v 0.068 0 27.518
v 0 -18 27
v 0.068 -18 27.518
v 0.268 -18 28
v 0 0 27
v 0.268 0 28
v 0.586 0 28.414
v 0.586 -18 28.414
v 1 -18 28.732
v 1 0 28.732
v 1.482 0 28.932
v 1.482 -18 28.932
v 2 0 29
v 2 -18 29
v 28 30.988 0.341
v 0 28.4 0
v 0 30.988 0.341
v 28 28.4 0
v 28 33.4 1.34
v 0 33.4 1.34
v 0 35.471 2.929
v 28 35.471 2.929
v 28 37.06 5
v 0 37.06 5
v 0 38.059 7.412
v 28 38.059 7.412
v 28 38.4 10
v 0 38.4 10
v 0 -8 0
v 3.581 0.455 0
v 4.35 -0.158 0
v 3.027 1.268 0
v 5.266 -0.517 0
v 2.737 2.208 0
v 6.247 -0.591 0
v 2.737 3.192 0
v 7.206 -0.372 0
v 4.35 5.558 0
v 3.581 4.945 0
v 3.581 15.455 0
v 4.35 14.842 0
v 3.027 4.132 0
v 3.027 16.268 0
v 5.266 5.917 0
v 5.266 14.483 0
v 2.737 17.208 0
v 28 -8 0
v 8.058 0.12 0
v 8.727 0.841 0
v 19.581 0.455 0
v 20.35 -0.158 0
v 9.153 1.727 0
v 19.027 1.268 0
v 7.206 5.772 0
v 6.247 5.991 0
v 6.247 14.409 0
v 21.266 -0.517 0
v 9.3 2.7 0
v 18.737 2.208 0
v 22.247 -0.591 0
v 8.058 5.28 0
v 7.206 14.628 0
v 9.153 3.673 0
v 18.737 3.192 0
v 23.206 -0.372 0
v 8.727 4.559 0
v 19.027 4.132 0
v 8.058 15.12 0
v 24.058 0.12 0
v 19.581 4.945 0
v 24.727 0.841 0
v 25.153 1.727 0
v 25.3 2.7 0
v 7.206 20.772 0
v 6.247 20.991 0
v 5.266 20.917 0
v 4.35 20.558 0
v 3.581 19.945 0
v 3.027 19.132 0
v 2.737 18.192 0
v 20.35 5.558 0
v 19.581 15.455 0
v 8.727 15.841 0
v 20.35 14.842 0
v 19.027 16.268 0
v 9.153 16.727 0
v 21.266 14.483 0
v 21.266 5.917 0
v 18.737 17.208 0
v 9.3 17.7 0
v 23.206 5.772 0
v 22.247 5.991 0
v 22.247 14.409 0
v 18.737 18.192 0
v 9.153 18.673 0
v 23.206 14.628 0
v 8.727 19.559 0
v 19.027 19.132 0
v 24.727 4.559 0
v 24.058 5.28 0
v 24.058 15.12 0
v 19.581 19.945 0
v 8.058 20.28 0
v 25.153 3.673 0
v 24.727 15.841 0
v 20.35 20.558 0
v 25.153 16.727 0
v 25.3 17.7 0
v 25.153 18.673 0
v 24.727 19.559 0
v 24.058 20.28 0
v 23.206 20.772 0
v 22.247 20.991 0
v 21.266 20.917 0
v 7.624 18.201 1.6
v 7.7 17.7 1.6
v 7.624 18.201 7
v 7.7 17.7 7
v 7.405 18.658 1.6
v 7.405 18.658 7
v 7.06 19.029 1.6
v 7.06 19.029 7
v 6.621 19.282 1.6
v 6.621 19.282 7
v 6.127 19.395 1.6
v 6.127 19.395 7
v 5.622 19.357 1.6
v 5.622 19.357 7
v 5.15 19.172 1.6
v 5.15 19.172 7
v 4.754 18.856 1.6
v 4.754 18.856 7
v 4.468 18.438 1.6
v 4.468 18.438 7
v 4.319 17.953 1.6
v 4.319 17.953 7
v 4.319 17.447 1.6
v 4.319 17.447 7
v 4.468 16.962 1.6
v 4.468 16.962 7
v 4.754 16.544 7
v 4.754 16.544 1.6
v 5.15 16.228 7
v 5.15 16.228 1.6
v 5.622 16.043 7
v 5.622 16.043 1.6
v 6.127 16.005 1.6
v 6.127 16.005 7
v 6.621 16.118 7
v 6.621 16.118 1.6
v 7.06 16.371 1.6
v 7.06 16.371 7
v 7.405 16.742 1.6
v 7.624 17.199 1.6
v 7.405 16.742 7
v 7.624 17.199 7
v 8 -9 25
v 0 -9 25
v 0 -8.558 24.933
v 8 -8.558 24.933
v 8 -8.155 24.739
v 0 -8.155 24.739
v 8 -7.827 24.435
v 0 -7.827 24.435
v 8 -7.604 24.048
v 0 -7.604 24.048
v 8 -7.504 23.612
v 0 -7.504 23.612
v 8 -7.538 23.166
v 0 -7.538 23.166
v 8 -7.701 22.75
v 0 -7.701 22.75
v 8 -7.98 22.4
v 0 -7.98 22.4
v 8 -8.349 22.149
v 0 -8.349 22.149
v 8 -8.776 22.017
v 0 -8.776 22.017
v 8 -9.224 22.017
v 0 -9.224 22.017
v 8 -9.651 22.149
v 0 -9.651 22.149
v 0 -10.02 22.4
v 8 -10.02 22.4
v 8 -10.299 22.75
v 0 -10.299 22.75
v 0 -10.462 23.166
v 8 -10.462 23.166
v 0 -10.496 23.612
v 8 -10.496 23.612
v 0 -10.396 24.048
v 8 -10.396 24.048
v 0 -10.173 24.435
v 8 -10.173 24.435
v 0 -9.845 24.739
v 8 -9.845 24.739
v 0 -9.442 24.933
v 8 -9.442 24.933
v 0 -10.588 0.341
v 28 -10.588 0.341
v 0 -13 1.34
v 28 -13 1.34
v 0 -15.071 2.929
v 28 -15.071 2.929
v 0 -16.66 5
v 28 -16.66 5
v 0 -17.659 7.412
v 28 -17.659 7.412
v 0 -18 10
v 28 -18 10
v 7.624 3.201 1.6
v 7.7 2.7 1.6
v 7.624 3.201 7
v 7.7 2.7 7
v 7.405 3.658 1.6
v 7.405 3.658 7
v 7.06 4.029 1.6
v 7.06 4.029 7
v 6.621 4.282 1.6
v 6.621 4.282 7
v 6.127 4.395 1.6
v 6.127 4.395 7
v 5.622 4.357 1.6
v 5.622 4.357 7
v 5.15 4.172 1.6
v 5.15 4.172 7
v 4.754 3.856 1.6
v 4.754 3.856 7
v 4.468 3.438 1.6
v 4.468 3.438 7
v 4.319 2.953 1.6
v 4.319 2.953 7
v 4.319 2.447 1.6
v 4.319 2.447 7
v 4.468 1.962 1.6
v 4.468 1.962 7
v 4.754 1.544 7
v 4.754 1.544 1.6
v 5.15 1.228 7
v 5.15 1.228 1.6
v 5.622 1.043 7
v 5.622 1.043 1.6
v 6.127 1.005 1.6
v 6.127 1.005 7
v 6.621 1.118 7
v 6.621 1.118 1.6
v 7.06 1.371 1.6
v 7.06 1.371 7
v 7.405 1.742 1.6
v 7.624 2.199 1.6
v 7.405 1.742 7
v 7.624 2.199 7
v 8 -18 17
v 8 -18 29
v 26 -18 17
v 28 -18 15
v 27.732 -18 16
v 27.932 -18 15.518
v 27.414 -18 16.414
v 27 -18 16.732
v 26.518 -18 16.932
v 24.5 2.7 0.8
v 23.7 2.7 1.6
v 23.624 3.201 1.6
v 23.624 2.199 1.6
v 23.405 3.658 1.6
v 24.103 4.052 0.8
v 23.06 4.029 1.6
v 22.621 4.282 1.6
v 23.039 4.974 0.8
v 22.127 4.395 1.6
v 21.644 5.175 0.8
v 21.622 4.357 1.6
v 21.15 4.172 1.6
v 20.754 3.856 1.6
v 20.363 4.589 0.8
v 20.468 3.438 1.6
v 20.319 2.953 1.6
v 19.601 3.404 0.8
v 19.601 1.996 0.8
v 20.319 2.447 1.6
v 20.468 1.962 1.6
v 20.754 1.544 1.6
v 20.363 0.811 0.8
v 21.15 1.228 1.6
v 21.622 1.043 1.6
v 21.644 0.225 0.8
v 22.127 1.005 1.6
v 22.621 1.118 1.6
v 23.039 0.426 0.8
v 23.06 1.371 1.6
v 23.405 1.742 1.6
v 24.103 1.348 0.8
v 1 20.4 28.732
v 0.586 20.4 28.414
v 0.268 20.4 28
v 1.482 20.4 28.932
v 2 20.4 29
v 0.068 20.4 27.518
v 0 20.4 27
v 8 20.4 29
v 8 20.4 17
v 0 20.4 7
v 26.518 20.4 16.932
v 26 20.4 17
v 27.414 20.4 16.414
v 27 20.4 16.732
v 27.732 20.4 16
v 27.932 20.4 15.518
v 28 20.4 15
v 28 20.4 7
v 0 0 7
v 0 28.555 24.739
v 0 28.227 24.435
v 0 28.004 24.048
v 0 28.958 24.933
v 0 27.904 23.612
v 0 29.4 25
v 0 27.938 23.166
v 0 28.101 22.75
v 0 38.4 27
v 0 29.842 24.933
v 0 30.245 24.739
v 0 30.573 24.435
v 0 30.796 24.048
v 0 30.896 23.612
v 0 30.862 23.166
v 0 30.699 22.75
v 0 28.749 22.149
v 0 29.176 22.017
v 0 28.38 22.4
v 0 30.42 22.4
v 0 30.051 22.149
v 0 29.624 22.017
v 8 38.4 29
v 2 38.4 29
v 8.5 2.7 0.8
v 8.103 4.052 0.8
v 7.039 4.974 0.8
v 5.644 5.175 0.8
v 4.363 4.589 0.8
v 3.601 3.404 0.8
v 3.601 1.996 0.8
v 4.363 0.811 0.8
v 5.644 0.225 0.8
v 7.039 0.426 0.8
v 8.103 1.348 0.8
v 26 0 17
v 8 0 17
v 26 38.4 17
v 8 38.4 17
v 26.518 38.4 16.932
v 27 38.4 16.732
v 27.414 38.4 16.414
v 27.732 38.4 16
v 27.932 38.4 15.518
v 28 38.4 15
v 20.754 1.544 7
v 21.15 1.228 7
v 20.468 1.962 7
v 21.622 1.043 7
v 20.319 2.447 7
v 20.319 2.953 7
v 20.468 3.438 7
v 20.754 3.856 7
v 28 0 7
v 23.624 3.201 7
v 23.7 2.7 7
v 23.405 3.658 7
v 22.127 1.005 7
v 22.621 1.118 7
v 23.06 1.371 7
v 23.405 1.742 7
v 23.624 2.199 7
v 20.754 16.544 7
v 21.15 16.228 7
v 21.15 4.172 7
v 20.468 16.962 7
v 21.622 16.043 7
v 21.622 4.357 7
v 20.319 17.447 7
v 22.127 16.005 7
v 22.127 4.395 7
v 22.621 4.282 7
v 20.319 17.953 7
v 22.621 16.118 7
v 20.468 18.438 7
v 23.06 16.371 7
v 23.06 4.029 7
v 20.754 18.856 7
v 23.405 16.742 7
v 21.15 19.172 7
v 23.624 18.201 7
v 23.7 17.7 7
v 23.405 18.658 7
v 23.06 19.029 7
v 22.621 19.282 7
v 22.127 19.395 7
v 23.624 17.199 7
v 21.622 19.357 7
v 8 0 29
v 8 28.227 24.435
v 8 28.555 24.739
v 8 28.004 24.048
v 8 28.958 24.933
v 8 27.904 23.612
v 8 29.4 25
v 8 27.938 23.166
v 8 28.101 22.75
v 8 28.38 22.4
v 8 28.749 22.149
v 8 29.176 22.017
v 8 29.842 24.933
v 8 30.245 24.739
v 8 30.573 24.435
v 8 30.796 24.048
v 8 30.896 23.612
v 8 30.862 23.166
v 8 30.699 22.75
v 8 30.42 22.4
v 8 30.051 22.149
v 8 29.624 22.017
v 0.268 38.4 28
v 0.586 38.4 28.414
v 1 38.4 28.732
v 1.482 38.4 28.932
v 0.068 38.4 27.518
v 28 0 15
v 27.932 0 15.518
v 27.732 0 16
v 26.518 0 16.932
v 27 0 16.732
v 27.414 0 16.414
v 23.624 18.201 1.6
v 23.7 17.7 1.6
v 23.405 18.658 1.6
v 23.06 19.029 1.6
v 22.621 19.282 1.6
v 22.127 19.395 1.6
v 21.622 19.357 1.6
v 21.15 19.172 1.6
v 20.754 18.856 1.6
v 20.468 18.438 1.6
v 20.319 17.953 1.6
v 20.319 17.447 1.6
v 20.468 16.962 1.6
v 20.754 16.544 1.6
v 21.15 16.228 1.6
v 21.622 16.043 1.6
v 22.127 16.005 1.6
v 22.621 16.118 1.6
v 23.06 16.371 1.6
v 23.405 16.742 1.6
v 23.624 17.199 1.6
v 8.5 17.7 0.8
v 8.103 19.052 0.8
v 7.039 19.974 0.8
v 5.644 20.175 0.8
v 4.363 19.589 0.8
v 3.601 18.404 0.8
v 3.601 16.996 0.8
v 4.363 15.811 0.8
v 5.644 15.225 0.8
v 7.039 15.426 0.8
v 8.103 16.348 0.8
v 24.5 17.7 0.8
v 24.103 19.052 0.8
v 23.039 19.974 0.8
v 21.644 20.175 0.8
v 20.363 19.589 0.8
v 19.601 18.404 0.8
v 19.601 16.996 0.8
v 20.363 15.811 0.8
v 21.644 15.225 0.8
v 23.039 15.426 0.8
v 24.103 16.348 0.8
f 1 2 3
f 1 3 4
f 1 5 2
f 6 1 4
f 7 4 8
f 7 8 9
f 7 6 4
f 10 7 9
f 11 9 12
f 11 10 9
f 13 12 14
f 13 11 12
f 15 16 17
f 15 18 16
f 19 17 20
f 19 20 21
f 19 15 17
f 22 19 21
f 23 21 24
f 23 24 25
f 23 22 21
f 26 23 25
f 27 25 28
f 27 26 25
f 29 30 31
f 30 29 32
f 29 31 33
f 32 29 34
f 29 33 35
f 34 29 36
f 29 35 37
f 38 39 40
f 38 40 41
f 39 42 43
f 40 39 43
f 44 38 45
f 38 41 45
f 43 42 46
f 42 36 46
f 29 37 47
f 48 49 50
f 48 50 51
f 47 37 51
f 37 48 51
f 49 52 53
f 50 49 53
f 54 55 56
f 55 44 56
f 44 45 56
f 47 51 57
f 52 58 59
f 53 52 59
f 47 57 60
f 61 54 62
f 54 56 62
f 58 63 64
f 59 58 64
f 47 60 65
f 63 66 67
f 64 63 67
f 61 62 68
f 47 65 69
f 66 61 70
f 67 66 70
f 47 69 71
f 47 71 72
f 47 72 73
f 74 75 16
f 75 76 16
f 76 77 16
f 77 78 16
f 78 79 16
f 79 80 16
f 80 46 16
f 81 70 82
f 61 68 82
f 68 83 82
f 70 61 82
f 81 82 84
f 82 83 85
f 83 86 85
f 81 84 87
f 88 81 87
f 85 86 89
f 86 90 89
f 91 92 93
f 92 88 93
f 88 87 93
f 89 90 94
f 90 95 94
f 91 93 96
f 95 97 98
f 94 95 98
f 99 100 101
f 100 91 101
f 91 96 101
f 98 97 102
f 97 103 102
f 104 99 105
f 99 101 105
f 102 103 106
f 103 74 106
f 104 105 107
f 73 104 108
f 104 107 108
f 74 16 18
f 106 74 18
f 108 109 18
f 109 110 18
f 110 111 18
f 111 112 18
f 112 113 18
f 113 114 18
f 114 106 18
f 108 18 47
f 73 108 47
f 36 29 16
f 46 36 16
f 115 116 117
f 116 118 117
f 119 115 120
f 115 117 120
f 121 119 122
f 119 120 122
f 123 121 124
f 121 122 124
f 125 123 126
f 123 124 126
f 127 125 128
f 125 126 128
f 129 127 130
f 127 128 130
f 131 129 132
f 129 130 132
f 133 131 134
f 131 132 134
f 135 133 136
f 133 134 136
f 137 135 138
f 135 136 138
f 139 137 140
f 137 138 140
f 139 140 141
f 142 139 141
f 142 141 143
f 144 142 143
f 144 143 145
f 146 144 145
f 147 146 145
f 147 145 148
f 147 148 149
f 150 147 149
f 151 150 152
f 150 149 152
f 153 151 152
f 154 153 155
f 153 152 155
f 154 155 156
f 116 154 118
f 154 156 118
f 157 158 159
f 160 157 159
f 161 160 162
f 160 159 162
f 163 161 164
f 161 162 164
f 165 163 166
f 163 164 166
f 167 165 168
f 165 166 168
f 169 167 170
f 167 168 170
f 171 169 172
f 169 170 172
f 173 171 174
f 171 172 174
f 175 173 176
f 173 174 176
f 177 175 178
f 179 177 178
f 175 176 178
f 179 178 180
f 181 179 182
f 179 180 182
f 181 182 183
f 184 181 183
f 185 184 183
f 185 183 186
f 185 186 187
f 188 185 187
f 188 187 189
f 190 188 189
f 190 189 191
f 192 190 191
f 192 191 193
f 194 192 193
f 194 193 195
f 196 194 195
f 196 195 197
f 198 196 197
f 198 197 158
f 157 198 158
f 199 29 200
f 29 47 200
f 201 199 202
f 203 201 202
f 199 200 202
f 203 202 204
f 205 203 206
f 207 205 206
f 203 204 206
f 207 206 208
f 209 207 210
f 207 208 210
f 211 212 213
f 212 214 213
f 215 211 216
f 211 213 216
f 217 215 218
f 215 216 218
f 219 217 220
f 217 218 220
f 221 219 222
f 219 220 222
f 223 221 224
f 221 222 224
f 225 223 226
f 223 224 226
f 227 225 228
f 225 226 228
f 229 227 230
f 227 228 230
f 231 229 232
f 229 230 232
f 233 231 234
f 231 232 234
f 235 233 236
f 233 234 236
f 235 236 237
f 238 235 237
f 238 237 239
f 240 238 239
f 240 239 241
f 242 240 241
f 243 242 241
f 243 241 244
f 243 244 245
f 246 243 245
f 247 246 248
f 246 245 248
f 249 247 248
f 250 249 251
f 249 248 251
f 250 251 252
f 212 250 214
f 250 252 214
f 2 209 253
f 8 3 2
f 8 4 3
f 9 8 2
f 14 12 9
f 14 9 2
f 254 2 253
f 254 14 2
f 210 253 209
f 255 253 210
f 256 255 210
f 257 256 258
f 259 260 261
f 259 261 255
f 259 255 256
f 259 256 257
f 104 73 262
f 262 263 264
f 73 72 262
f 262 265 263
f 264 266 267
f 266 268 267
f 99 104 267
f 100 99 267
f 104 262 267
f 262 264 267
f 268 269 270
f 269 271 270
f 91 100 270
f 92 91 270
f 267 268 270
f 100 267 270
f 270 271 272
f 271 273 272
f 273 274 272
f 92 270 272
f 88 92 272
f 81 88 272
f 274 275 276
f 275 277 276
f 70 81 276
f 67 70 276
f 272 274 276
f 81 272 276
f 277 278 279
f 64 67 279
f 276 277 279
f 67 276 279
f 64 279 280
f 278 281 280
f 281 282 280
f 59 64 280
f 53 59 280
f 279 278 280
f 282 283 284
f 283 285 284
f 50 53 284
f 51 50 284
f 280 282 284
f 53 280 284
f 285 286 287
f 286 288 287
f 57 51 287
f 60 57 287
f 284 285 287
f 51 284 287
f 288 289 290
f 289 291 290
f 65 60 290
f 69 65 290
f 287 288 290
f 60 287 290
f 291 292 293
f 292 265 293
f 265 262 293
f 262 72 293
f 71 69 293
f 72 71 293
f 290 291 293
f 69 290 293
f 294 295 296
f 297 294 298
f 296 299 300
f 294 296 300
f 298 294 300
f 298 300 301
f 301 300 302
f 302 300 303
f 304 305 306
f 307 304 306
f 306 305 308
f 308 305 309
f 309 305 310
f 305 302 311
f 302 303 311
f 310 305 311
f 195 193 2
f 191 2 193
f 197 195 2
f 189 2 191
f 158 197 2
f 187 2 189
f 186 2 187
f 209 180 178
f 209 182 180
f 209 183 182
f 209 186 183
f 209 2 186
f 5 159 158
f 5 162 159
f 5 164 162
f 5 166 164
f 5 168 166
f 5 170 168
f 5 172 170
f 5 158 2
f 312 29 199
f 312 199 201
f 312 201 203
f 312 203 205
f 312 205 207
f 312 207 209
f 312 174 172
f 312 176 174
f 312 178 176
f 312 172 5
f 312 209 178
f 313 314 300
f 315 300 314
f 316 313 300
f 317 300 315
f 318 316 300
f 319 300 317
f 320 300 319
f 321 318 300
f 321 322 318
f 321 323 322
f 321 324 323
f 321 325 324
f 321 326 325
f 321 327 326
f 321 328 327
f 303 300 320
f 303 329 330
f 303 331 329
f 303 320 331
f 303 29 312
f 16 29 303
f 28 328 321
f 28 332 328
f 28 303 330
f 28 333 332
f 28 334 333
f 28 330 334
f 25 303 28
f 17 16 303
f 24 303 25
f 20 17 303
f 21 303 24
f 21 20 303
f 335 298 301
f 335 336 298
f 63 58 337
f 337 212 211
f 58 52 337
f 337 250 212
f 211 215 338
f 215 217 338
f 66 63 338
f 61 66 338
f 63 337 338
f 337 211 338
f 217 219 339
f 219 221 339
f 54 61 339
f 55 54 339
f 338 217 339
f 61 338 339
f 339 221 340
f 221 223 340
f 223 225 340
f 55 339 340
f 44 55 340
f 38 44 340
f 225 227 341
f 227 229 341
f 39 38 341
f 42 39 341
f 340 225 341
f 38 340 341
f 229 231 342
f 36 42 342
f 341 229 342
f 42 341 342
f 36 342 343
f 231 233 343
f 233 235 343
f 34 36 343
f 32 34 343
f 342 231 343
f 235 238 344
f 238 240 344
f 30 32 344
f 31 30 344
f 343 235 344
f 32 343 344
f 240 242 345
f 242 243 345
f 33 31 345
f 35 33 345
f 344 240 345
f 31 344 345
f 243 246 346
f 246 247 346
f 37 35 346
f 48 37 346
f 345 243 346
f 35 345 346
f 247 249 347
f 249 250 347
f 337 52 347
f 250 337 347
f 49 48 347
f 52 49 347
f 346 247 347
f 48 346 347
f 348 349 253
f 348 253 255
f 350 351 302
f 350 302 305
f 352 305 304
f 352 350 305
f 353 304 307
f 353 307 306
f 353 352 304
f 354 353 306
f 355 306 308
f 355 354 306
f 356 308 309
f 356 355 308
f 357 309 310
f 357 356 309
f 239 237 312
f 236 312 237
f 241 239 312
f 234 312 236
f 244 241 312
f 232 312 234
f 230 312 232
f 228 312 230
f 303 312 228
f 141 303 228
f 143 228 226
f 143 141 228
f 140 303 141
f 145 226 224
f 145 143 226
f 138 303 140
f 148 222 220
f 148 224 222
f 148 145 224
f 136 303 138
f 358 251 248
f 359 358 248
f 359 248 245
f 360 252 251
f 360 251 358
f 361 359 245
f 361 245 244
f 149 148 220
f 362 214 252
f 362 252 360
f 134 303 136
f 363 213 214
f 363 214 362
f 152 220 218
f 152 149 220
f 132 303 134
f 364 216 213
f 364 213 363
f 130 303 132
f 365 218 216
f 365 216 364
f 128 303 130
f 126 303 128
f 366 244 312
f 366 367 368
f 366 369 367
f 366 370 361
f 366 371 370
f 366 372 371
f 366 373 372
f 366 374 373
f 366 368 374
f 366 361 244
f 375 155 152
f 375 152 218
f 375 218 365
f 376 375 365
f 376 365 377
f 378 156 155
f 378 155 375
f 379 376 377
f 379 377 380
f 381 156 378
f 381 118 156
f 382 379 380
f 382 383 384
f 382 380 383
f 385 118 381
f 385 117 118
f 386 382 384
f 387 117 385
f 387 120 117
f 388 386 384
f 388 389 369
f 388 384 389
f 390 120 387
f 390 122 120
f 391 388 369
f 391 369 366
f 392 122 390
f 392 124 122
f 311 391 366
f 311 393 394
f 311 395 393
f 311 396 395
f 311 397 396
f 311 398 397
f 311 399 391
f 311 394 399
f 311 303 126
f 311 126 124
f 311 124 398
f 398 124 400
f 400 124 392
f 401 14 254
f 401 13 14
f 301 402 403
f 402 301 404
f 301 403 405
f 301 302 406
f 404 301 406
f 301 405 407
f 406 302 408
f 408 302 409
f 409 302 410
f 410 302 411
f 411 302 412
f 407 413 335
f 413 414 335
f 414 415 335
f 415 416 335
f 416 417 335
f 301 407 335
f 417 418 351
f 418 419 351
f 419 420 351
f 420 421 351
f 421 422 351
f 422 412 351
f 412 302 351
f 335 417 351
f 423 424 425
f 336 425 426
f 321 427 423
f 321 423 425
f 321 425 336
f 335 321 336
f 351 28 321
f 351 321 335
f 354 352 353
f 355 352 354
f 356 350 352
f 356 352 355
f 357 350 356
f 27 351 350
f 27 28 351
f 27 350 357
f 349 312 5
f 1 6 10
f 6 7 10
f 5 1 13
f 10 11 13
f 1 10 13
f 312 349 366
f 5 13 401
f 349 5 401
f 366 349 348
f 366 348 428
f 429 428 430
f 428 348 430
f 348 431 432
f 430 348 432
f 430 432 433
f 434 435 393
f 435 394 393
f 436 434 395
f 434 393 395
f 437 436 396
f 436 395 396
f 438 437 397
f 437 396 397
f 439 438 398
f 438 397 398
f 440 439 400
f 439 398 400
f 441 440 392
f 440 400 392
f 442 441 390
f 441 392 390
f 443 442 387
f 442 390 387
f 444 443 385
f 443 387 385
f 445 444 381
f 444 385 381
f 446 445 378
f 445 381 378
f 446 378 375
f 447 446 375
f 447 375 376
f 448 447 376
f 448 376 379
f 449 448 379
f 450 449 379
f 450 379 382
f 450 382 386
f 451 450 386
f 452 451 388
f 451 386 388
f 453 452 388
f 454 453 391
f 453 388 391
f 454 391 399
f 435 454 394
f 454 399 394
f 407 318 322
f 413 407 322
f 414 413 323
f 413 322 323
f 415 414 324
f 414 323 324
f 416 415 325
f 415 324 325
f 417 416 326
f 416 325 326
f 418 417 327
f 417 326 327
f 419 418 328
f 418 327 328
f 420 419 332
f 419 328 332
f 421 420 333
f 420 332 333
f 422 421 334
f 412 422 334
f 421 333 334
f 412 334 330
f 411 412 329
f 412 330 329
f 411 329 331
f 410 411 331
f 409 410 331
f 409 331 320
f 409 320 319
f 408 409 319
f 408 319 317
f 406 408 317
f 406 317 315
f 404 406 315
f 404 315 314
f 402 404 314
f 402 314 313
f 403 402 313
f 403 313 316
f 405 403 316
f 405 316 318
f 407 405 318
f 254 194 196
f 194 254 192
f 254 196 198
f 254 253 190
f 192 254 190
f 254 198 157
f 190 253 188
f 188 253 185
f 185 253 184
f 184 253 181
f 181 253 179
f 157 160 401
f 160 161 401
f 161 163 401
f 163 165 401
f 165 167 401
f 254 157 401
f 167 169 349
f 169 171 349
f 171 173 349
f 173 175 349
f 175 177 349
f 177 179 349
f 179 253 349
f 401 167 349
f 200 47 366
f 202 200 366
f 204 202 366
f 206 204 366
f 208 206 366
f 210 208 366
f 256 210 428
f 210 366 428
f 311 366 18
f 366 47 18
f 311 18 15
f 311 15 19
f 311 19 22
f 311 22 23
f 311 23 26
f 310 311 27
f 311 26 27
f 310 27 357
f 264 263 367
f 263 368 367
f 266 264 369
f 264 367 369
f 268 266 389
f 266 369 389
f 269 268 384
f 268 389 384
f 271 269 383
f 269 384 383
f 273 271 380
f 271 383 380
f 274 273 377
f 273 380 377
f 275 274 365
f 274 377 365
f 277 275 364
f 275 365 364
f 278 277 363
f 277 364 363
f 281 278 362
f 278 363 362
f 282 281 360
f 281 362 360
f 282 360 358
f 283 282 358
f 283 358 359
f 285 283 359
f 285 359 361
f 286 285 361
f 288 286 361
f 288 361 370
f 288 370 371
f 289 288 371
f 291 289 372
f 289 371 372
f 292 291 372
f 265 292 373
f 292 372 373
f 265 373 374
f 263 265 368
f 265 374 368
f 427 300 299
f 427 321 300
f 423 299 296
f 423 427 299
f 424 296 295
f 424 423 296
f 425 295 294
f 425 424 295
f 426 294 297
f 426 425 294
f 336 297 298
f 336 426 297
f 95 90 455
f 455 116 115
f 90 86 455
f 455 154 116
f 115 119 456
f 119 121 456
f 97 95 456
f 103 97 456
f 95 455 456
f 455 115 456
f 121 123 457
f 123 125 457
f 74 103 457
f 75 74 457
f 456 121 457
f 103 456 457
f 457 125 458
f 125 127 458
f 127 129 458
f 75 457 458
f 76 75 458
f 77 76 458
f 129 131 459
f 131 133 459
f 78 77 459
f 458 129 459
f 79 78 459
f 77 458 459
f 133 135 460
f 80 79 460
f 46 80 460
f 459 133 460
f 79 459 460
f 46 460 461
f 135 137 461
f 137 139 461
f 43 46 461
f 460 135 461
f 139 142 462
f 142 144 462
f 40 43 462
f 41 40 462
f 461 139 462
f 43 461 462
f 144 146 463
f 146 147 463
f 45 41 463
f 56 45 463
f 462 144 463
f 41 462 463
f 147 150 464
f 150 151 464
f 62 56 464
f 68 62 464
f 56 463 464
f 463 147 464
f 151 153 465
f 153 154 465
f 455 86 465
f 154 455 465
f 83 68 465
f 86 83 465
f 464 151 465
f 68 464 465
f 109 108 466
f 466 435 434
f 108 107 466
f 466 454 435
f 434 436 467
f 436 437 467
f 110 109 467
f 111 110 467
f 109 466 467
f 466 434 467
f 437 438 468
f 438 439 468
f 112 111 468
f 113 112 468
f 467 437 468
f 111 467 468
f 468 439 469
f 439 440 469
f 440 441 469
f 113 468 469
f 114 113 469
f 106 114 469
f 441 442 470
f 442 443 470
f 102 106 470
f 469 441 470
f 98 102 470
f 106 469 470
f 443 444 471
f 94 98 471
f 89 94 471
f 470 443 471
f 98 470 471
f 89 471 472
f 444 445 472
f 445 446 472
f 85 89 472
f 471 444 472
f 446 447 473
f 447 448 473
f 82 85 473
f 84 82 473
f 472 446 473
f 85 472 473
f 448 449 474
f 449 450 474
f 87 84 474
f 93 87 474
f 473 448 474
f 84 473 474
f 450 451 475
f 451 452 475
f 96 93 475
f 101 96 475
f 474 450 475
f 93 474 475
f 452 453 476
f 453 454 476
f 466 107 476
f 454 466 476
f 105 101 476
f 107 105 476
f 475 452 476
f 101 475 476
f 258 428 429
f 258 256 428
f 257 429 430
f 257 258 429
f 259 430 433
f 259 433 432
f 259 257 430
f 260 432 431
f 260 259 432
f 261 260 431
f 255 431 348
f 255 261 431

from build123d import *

# Parameters (mm, degrees)
SKETCH_2_W                = 28
SKETCH_2_H                = 20.4
EXTRUDE_2_DEPTH           = 7
SKETCH_5_W                = 28
SKETCH_5_H                = 17
EXTRUDE_3_DEPTH           = 18
SKETCH_6_W                = 28
SKETCH_6_H                = 17
EXTRUDE_4_DEPTH           = 18
HOLE_WIZARD_2_D           = 3.4
HOLE_WIZARD_2_CSINK_D     = 6.6
HOLE_WIZARD_2_CSINK_ANGLE = 90
FILLET_1_R                = 10
SKETCH_18_W               = 8
SKETCH_18_H               = 18
EXTRUDE_5_DEPTH           = 12
SKETCH_19_R               = 1.5
CUT_EXTRUDE_6_DEPTH       = 56.673692171
FILLET_2_R                = 2


with BuildPart() as part:
    # 草图2 → 凸台-拉伸2 (new body)
    with BuildSketch(Plane.XY):
        with Locations((14, 10.2)):
            Rectangle(SKETCH_2_W, SKETCH_2_H)
    extrude(amount=EXTRUDE_2_DEPTH)

    # 草图5 → 凸台-拉伸3 (add)
    with BuildSketch(Plane(origin=(0, 20.4, 0), x_dir=(1, 0, 0), z_dir=(0, 1, 0))):
        with Locations((14, -8.5)):
            Rectangle(SKETCH_5_W, SKETCH_5_H)
    extrude(amount=EXTRUDE_3_DEPTH)

    # 草图6 → 凸台-拉伸4 (add)
    with BuildSketch(Plane.XZ):
        with Locations((14, 8.5)):
            Rectangle(SKETCH_6_W, SKETCH_6_H)
    extrude(amount=EXTRUDE_4_DEPTH)

    # 打孔尺寸(%根据十字)槽半沉头木螺钉的类型2 (through all)
    with Locations(Plane(origin=(0, 0, 0), x_dir=(-1, 0, 0), z_dir=(0, 0, -1))):
        with Locations((-22, 17.7), (-6, 17.7), (-6, 2.7), (-22, 2.7)):
            CounterSinkHole(HOLE_WIZARD_2_D / 2, HOLE_WIZARD_2_CSINK_D / 2, counter_sink_angle=HOLE_WIZARD_2_CSINK_ANGLE)

    # 圆角1
    fillet_1_edges = [part.edges().sort_by_distance(p)[0] for p in [
        (14, 38.4, 0),
        (14, -18, 0),
    ]]
    fillet(fillet_1_edges, radius=FILLET_1_R)

    # 草图18 → 凸台-拉伸5 (add)
    with BuildSketch(Plane.XY.offset(17)):
        with Locations((4, 29.4)):
            Rectangle(SKETCH_18_W, SKETCH_18_H)
        with Locations((4, -9)):
            Rectangle(SKETCH_18_W, SKETCH_18_H)
    extrude(amount=EXTRUDE_5_DEPTH)

    # 草图19 → 切除-拉伸6 (cut, through all)
    with BuildSketch(Plane.ZY):
        with Locations((23.5, 29.4)):
            Circle(SKETCH_19_R)
        with Locations((23.5, -9)):
            Circle(SKETCH_19_R)
    extrude(amount=-CUT_EXTRUDE_6_DEPTH, mode=Mode.SUBTRACT)

    # 圆角2
    fillet_2_edges = [part.edges().sort_by_distance(p)[0] for p in [
        (28, 29.4, 17),
        (28, -9, 17),
        (0, 29.4, 29),
        (0, -9, 29),
    ]]
    fillet(fillet_2_edges, radius=FILLET_2_R)


solid = part.part
